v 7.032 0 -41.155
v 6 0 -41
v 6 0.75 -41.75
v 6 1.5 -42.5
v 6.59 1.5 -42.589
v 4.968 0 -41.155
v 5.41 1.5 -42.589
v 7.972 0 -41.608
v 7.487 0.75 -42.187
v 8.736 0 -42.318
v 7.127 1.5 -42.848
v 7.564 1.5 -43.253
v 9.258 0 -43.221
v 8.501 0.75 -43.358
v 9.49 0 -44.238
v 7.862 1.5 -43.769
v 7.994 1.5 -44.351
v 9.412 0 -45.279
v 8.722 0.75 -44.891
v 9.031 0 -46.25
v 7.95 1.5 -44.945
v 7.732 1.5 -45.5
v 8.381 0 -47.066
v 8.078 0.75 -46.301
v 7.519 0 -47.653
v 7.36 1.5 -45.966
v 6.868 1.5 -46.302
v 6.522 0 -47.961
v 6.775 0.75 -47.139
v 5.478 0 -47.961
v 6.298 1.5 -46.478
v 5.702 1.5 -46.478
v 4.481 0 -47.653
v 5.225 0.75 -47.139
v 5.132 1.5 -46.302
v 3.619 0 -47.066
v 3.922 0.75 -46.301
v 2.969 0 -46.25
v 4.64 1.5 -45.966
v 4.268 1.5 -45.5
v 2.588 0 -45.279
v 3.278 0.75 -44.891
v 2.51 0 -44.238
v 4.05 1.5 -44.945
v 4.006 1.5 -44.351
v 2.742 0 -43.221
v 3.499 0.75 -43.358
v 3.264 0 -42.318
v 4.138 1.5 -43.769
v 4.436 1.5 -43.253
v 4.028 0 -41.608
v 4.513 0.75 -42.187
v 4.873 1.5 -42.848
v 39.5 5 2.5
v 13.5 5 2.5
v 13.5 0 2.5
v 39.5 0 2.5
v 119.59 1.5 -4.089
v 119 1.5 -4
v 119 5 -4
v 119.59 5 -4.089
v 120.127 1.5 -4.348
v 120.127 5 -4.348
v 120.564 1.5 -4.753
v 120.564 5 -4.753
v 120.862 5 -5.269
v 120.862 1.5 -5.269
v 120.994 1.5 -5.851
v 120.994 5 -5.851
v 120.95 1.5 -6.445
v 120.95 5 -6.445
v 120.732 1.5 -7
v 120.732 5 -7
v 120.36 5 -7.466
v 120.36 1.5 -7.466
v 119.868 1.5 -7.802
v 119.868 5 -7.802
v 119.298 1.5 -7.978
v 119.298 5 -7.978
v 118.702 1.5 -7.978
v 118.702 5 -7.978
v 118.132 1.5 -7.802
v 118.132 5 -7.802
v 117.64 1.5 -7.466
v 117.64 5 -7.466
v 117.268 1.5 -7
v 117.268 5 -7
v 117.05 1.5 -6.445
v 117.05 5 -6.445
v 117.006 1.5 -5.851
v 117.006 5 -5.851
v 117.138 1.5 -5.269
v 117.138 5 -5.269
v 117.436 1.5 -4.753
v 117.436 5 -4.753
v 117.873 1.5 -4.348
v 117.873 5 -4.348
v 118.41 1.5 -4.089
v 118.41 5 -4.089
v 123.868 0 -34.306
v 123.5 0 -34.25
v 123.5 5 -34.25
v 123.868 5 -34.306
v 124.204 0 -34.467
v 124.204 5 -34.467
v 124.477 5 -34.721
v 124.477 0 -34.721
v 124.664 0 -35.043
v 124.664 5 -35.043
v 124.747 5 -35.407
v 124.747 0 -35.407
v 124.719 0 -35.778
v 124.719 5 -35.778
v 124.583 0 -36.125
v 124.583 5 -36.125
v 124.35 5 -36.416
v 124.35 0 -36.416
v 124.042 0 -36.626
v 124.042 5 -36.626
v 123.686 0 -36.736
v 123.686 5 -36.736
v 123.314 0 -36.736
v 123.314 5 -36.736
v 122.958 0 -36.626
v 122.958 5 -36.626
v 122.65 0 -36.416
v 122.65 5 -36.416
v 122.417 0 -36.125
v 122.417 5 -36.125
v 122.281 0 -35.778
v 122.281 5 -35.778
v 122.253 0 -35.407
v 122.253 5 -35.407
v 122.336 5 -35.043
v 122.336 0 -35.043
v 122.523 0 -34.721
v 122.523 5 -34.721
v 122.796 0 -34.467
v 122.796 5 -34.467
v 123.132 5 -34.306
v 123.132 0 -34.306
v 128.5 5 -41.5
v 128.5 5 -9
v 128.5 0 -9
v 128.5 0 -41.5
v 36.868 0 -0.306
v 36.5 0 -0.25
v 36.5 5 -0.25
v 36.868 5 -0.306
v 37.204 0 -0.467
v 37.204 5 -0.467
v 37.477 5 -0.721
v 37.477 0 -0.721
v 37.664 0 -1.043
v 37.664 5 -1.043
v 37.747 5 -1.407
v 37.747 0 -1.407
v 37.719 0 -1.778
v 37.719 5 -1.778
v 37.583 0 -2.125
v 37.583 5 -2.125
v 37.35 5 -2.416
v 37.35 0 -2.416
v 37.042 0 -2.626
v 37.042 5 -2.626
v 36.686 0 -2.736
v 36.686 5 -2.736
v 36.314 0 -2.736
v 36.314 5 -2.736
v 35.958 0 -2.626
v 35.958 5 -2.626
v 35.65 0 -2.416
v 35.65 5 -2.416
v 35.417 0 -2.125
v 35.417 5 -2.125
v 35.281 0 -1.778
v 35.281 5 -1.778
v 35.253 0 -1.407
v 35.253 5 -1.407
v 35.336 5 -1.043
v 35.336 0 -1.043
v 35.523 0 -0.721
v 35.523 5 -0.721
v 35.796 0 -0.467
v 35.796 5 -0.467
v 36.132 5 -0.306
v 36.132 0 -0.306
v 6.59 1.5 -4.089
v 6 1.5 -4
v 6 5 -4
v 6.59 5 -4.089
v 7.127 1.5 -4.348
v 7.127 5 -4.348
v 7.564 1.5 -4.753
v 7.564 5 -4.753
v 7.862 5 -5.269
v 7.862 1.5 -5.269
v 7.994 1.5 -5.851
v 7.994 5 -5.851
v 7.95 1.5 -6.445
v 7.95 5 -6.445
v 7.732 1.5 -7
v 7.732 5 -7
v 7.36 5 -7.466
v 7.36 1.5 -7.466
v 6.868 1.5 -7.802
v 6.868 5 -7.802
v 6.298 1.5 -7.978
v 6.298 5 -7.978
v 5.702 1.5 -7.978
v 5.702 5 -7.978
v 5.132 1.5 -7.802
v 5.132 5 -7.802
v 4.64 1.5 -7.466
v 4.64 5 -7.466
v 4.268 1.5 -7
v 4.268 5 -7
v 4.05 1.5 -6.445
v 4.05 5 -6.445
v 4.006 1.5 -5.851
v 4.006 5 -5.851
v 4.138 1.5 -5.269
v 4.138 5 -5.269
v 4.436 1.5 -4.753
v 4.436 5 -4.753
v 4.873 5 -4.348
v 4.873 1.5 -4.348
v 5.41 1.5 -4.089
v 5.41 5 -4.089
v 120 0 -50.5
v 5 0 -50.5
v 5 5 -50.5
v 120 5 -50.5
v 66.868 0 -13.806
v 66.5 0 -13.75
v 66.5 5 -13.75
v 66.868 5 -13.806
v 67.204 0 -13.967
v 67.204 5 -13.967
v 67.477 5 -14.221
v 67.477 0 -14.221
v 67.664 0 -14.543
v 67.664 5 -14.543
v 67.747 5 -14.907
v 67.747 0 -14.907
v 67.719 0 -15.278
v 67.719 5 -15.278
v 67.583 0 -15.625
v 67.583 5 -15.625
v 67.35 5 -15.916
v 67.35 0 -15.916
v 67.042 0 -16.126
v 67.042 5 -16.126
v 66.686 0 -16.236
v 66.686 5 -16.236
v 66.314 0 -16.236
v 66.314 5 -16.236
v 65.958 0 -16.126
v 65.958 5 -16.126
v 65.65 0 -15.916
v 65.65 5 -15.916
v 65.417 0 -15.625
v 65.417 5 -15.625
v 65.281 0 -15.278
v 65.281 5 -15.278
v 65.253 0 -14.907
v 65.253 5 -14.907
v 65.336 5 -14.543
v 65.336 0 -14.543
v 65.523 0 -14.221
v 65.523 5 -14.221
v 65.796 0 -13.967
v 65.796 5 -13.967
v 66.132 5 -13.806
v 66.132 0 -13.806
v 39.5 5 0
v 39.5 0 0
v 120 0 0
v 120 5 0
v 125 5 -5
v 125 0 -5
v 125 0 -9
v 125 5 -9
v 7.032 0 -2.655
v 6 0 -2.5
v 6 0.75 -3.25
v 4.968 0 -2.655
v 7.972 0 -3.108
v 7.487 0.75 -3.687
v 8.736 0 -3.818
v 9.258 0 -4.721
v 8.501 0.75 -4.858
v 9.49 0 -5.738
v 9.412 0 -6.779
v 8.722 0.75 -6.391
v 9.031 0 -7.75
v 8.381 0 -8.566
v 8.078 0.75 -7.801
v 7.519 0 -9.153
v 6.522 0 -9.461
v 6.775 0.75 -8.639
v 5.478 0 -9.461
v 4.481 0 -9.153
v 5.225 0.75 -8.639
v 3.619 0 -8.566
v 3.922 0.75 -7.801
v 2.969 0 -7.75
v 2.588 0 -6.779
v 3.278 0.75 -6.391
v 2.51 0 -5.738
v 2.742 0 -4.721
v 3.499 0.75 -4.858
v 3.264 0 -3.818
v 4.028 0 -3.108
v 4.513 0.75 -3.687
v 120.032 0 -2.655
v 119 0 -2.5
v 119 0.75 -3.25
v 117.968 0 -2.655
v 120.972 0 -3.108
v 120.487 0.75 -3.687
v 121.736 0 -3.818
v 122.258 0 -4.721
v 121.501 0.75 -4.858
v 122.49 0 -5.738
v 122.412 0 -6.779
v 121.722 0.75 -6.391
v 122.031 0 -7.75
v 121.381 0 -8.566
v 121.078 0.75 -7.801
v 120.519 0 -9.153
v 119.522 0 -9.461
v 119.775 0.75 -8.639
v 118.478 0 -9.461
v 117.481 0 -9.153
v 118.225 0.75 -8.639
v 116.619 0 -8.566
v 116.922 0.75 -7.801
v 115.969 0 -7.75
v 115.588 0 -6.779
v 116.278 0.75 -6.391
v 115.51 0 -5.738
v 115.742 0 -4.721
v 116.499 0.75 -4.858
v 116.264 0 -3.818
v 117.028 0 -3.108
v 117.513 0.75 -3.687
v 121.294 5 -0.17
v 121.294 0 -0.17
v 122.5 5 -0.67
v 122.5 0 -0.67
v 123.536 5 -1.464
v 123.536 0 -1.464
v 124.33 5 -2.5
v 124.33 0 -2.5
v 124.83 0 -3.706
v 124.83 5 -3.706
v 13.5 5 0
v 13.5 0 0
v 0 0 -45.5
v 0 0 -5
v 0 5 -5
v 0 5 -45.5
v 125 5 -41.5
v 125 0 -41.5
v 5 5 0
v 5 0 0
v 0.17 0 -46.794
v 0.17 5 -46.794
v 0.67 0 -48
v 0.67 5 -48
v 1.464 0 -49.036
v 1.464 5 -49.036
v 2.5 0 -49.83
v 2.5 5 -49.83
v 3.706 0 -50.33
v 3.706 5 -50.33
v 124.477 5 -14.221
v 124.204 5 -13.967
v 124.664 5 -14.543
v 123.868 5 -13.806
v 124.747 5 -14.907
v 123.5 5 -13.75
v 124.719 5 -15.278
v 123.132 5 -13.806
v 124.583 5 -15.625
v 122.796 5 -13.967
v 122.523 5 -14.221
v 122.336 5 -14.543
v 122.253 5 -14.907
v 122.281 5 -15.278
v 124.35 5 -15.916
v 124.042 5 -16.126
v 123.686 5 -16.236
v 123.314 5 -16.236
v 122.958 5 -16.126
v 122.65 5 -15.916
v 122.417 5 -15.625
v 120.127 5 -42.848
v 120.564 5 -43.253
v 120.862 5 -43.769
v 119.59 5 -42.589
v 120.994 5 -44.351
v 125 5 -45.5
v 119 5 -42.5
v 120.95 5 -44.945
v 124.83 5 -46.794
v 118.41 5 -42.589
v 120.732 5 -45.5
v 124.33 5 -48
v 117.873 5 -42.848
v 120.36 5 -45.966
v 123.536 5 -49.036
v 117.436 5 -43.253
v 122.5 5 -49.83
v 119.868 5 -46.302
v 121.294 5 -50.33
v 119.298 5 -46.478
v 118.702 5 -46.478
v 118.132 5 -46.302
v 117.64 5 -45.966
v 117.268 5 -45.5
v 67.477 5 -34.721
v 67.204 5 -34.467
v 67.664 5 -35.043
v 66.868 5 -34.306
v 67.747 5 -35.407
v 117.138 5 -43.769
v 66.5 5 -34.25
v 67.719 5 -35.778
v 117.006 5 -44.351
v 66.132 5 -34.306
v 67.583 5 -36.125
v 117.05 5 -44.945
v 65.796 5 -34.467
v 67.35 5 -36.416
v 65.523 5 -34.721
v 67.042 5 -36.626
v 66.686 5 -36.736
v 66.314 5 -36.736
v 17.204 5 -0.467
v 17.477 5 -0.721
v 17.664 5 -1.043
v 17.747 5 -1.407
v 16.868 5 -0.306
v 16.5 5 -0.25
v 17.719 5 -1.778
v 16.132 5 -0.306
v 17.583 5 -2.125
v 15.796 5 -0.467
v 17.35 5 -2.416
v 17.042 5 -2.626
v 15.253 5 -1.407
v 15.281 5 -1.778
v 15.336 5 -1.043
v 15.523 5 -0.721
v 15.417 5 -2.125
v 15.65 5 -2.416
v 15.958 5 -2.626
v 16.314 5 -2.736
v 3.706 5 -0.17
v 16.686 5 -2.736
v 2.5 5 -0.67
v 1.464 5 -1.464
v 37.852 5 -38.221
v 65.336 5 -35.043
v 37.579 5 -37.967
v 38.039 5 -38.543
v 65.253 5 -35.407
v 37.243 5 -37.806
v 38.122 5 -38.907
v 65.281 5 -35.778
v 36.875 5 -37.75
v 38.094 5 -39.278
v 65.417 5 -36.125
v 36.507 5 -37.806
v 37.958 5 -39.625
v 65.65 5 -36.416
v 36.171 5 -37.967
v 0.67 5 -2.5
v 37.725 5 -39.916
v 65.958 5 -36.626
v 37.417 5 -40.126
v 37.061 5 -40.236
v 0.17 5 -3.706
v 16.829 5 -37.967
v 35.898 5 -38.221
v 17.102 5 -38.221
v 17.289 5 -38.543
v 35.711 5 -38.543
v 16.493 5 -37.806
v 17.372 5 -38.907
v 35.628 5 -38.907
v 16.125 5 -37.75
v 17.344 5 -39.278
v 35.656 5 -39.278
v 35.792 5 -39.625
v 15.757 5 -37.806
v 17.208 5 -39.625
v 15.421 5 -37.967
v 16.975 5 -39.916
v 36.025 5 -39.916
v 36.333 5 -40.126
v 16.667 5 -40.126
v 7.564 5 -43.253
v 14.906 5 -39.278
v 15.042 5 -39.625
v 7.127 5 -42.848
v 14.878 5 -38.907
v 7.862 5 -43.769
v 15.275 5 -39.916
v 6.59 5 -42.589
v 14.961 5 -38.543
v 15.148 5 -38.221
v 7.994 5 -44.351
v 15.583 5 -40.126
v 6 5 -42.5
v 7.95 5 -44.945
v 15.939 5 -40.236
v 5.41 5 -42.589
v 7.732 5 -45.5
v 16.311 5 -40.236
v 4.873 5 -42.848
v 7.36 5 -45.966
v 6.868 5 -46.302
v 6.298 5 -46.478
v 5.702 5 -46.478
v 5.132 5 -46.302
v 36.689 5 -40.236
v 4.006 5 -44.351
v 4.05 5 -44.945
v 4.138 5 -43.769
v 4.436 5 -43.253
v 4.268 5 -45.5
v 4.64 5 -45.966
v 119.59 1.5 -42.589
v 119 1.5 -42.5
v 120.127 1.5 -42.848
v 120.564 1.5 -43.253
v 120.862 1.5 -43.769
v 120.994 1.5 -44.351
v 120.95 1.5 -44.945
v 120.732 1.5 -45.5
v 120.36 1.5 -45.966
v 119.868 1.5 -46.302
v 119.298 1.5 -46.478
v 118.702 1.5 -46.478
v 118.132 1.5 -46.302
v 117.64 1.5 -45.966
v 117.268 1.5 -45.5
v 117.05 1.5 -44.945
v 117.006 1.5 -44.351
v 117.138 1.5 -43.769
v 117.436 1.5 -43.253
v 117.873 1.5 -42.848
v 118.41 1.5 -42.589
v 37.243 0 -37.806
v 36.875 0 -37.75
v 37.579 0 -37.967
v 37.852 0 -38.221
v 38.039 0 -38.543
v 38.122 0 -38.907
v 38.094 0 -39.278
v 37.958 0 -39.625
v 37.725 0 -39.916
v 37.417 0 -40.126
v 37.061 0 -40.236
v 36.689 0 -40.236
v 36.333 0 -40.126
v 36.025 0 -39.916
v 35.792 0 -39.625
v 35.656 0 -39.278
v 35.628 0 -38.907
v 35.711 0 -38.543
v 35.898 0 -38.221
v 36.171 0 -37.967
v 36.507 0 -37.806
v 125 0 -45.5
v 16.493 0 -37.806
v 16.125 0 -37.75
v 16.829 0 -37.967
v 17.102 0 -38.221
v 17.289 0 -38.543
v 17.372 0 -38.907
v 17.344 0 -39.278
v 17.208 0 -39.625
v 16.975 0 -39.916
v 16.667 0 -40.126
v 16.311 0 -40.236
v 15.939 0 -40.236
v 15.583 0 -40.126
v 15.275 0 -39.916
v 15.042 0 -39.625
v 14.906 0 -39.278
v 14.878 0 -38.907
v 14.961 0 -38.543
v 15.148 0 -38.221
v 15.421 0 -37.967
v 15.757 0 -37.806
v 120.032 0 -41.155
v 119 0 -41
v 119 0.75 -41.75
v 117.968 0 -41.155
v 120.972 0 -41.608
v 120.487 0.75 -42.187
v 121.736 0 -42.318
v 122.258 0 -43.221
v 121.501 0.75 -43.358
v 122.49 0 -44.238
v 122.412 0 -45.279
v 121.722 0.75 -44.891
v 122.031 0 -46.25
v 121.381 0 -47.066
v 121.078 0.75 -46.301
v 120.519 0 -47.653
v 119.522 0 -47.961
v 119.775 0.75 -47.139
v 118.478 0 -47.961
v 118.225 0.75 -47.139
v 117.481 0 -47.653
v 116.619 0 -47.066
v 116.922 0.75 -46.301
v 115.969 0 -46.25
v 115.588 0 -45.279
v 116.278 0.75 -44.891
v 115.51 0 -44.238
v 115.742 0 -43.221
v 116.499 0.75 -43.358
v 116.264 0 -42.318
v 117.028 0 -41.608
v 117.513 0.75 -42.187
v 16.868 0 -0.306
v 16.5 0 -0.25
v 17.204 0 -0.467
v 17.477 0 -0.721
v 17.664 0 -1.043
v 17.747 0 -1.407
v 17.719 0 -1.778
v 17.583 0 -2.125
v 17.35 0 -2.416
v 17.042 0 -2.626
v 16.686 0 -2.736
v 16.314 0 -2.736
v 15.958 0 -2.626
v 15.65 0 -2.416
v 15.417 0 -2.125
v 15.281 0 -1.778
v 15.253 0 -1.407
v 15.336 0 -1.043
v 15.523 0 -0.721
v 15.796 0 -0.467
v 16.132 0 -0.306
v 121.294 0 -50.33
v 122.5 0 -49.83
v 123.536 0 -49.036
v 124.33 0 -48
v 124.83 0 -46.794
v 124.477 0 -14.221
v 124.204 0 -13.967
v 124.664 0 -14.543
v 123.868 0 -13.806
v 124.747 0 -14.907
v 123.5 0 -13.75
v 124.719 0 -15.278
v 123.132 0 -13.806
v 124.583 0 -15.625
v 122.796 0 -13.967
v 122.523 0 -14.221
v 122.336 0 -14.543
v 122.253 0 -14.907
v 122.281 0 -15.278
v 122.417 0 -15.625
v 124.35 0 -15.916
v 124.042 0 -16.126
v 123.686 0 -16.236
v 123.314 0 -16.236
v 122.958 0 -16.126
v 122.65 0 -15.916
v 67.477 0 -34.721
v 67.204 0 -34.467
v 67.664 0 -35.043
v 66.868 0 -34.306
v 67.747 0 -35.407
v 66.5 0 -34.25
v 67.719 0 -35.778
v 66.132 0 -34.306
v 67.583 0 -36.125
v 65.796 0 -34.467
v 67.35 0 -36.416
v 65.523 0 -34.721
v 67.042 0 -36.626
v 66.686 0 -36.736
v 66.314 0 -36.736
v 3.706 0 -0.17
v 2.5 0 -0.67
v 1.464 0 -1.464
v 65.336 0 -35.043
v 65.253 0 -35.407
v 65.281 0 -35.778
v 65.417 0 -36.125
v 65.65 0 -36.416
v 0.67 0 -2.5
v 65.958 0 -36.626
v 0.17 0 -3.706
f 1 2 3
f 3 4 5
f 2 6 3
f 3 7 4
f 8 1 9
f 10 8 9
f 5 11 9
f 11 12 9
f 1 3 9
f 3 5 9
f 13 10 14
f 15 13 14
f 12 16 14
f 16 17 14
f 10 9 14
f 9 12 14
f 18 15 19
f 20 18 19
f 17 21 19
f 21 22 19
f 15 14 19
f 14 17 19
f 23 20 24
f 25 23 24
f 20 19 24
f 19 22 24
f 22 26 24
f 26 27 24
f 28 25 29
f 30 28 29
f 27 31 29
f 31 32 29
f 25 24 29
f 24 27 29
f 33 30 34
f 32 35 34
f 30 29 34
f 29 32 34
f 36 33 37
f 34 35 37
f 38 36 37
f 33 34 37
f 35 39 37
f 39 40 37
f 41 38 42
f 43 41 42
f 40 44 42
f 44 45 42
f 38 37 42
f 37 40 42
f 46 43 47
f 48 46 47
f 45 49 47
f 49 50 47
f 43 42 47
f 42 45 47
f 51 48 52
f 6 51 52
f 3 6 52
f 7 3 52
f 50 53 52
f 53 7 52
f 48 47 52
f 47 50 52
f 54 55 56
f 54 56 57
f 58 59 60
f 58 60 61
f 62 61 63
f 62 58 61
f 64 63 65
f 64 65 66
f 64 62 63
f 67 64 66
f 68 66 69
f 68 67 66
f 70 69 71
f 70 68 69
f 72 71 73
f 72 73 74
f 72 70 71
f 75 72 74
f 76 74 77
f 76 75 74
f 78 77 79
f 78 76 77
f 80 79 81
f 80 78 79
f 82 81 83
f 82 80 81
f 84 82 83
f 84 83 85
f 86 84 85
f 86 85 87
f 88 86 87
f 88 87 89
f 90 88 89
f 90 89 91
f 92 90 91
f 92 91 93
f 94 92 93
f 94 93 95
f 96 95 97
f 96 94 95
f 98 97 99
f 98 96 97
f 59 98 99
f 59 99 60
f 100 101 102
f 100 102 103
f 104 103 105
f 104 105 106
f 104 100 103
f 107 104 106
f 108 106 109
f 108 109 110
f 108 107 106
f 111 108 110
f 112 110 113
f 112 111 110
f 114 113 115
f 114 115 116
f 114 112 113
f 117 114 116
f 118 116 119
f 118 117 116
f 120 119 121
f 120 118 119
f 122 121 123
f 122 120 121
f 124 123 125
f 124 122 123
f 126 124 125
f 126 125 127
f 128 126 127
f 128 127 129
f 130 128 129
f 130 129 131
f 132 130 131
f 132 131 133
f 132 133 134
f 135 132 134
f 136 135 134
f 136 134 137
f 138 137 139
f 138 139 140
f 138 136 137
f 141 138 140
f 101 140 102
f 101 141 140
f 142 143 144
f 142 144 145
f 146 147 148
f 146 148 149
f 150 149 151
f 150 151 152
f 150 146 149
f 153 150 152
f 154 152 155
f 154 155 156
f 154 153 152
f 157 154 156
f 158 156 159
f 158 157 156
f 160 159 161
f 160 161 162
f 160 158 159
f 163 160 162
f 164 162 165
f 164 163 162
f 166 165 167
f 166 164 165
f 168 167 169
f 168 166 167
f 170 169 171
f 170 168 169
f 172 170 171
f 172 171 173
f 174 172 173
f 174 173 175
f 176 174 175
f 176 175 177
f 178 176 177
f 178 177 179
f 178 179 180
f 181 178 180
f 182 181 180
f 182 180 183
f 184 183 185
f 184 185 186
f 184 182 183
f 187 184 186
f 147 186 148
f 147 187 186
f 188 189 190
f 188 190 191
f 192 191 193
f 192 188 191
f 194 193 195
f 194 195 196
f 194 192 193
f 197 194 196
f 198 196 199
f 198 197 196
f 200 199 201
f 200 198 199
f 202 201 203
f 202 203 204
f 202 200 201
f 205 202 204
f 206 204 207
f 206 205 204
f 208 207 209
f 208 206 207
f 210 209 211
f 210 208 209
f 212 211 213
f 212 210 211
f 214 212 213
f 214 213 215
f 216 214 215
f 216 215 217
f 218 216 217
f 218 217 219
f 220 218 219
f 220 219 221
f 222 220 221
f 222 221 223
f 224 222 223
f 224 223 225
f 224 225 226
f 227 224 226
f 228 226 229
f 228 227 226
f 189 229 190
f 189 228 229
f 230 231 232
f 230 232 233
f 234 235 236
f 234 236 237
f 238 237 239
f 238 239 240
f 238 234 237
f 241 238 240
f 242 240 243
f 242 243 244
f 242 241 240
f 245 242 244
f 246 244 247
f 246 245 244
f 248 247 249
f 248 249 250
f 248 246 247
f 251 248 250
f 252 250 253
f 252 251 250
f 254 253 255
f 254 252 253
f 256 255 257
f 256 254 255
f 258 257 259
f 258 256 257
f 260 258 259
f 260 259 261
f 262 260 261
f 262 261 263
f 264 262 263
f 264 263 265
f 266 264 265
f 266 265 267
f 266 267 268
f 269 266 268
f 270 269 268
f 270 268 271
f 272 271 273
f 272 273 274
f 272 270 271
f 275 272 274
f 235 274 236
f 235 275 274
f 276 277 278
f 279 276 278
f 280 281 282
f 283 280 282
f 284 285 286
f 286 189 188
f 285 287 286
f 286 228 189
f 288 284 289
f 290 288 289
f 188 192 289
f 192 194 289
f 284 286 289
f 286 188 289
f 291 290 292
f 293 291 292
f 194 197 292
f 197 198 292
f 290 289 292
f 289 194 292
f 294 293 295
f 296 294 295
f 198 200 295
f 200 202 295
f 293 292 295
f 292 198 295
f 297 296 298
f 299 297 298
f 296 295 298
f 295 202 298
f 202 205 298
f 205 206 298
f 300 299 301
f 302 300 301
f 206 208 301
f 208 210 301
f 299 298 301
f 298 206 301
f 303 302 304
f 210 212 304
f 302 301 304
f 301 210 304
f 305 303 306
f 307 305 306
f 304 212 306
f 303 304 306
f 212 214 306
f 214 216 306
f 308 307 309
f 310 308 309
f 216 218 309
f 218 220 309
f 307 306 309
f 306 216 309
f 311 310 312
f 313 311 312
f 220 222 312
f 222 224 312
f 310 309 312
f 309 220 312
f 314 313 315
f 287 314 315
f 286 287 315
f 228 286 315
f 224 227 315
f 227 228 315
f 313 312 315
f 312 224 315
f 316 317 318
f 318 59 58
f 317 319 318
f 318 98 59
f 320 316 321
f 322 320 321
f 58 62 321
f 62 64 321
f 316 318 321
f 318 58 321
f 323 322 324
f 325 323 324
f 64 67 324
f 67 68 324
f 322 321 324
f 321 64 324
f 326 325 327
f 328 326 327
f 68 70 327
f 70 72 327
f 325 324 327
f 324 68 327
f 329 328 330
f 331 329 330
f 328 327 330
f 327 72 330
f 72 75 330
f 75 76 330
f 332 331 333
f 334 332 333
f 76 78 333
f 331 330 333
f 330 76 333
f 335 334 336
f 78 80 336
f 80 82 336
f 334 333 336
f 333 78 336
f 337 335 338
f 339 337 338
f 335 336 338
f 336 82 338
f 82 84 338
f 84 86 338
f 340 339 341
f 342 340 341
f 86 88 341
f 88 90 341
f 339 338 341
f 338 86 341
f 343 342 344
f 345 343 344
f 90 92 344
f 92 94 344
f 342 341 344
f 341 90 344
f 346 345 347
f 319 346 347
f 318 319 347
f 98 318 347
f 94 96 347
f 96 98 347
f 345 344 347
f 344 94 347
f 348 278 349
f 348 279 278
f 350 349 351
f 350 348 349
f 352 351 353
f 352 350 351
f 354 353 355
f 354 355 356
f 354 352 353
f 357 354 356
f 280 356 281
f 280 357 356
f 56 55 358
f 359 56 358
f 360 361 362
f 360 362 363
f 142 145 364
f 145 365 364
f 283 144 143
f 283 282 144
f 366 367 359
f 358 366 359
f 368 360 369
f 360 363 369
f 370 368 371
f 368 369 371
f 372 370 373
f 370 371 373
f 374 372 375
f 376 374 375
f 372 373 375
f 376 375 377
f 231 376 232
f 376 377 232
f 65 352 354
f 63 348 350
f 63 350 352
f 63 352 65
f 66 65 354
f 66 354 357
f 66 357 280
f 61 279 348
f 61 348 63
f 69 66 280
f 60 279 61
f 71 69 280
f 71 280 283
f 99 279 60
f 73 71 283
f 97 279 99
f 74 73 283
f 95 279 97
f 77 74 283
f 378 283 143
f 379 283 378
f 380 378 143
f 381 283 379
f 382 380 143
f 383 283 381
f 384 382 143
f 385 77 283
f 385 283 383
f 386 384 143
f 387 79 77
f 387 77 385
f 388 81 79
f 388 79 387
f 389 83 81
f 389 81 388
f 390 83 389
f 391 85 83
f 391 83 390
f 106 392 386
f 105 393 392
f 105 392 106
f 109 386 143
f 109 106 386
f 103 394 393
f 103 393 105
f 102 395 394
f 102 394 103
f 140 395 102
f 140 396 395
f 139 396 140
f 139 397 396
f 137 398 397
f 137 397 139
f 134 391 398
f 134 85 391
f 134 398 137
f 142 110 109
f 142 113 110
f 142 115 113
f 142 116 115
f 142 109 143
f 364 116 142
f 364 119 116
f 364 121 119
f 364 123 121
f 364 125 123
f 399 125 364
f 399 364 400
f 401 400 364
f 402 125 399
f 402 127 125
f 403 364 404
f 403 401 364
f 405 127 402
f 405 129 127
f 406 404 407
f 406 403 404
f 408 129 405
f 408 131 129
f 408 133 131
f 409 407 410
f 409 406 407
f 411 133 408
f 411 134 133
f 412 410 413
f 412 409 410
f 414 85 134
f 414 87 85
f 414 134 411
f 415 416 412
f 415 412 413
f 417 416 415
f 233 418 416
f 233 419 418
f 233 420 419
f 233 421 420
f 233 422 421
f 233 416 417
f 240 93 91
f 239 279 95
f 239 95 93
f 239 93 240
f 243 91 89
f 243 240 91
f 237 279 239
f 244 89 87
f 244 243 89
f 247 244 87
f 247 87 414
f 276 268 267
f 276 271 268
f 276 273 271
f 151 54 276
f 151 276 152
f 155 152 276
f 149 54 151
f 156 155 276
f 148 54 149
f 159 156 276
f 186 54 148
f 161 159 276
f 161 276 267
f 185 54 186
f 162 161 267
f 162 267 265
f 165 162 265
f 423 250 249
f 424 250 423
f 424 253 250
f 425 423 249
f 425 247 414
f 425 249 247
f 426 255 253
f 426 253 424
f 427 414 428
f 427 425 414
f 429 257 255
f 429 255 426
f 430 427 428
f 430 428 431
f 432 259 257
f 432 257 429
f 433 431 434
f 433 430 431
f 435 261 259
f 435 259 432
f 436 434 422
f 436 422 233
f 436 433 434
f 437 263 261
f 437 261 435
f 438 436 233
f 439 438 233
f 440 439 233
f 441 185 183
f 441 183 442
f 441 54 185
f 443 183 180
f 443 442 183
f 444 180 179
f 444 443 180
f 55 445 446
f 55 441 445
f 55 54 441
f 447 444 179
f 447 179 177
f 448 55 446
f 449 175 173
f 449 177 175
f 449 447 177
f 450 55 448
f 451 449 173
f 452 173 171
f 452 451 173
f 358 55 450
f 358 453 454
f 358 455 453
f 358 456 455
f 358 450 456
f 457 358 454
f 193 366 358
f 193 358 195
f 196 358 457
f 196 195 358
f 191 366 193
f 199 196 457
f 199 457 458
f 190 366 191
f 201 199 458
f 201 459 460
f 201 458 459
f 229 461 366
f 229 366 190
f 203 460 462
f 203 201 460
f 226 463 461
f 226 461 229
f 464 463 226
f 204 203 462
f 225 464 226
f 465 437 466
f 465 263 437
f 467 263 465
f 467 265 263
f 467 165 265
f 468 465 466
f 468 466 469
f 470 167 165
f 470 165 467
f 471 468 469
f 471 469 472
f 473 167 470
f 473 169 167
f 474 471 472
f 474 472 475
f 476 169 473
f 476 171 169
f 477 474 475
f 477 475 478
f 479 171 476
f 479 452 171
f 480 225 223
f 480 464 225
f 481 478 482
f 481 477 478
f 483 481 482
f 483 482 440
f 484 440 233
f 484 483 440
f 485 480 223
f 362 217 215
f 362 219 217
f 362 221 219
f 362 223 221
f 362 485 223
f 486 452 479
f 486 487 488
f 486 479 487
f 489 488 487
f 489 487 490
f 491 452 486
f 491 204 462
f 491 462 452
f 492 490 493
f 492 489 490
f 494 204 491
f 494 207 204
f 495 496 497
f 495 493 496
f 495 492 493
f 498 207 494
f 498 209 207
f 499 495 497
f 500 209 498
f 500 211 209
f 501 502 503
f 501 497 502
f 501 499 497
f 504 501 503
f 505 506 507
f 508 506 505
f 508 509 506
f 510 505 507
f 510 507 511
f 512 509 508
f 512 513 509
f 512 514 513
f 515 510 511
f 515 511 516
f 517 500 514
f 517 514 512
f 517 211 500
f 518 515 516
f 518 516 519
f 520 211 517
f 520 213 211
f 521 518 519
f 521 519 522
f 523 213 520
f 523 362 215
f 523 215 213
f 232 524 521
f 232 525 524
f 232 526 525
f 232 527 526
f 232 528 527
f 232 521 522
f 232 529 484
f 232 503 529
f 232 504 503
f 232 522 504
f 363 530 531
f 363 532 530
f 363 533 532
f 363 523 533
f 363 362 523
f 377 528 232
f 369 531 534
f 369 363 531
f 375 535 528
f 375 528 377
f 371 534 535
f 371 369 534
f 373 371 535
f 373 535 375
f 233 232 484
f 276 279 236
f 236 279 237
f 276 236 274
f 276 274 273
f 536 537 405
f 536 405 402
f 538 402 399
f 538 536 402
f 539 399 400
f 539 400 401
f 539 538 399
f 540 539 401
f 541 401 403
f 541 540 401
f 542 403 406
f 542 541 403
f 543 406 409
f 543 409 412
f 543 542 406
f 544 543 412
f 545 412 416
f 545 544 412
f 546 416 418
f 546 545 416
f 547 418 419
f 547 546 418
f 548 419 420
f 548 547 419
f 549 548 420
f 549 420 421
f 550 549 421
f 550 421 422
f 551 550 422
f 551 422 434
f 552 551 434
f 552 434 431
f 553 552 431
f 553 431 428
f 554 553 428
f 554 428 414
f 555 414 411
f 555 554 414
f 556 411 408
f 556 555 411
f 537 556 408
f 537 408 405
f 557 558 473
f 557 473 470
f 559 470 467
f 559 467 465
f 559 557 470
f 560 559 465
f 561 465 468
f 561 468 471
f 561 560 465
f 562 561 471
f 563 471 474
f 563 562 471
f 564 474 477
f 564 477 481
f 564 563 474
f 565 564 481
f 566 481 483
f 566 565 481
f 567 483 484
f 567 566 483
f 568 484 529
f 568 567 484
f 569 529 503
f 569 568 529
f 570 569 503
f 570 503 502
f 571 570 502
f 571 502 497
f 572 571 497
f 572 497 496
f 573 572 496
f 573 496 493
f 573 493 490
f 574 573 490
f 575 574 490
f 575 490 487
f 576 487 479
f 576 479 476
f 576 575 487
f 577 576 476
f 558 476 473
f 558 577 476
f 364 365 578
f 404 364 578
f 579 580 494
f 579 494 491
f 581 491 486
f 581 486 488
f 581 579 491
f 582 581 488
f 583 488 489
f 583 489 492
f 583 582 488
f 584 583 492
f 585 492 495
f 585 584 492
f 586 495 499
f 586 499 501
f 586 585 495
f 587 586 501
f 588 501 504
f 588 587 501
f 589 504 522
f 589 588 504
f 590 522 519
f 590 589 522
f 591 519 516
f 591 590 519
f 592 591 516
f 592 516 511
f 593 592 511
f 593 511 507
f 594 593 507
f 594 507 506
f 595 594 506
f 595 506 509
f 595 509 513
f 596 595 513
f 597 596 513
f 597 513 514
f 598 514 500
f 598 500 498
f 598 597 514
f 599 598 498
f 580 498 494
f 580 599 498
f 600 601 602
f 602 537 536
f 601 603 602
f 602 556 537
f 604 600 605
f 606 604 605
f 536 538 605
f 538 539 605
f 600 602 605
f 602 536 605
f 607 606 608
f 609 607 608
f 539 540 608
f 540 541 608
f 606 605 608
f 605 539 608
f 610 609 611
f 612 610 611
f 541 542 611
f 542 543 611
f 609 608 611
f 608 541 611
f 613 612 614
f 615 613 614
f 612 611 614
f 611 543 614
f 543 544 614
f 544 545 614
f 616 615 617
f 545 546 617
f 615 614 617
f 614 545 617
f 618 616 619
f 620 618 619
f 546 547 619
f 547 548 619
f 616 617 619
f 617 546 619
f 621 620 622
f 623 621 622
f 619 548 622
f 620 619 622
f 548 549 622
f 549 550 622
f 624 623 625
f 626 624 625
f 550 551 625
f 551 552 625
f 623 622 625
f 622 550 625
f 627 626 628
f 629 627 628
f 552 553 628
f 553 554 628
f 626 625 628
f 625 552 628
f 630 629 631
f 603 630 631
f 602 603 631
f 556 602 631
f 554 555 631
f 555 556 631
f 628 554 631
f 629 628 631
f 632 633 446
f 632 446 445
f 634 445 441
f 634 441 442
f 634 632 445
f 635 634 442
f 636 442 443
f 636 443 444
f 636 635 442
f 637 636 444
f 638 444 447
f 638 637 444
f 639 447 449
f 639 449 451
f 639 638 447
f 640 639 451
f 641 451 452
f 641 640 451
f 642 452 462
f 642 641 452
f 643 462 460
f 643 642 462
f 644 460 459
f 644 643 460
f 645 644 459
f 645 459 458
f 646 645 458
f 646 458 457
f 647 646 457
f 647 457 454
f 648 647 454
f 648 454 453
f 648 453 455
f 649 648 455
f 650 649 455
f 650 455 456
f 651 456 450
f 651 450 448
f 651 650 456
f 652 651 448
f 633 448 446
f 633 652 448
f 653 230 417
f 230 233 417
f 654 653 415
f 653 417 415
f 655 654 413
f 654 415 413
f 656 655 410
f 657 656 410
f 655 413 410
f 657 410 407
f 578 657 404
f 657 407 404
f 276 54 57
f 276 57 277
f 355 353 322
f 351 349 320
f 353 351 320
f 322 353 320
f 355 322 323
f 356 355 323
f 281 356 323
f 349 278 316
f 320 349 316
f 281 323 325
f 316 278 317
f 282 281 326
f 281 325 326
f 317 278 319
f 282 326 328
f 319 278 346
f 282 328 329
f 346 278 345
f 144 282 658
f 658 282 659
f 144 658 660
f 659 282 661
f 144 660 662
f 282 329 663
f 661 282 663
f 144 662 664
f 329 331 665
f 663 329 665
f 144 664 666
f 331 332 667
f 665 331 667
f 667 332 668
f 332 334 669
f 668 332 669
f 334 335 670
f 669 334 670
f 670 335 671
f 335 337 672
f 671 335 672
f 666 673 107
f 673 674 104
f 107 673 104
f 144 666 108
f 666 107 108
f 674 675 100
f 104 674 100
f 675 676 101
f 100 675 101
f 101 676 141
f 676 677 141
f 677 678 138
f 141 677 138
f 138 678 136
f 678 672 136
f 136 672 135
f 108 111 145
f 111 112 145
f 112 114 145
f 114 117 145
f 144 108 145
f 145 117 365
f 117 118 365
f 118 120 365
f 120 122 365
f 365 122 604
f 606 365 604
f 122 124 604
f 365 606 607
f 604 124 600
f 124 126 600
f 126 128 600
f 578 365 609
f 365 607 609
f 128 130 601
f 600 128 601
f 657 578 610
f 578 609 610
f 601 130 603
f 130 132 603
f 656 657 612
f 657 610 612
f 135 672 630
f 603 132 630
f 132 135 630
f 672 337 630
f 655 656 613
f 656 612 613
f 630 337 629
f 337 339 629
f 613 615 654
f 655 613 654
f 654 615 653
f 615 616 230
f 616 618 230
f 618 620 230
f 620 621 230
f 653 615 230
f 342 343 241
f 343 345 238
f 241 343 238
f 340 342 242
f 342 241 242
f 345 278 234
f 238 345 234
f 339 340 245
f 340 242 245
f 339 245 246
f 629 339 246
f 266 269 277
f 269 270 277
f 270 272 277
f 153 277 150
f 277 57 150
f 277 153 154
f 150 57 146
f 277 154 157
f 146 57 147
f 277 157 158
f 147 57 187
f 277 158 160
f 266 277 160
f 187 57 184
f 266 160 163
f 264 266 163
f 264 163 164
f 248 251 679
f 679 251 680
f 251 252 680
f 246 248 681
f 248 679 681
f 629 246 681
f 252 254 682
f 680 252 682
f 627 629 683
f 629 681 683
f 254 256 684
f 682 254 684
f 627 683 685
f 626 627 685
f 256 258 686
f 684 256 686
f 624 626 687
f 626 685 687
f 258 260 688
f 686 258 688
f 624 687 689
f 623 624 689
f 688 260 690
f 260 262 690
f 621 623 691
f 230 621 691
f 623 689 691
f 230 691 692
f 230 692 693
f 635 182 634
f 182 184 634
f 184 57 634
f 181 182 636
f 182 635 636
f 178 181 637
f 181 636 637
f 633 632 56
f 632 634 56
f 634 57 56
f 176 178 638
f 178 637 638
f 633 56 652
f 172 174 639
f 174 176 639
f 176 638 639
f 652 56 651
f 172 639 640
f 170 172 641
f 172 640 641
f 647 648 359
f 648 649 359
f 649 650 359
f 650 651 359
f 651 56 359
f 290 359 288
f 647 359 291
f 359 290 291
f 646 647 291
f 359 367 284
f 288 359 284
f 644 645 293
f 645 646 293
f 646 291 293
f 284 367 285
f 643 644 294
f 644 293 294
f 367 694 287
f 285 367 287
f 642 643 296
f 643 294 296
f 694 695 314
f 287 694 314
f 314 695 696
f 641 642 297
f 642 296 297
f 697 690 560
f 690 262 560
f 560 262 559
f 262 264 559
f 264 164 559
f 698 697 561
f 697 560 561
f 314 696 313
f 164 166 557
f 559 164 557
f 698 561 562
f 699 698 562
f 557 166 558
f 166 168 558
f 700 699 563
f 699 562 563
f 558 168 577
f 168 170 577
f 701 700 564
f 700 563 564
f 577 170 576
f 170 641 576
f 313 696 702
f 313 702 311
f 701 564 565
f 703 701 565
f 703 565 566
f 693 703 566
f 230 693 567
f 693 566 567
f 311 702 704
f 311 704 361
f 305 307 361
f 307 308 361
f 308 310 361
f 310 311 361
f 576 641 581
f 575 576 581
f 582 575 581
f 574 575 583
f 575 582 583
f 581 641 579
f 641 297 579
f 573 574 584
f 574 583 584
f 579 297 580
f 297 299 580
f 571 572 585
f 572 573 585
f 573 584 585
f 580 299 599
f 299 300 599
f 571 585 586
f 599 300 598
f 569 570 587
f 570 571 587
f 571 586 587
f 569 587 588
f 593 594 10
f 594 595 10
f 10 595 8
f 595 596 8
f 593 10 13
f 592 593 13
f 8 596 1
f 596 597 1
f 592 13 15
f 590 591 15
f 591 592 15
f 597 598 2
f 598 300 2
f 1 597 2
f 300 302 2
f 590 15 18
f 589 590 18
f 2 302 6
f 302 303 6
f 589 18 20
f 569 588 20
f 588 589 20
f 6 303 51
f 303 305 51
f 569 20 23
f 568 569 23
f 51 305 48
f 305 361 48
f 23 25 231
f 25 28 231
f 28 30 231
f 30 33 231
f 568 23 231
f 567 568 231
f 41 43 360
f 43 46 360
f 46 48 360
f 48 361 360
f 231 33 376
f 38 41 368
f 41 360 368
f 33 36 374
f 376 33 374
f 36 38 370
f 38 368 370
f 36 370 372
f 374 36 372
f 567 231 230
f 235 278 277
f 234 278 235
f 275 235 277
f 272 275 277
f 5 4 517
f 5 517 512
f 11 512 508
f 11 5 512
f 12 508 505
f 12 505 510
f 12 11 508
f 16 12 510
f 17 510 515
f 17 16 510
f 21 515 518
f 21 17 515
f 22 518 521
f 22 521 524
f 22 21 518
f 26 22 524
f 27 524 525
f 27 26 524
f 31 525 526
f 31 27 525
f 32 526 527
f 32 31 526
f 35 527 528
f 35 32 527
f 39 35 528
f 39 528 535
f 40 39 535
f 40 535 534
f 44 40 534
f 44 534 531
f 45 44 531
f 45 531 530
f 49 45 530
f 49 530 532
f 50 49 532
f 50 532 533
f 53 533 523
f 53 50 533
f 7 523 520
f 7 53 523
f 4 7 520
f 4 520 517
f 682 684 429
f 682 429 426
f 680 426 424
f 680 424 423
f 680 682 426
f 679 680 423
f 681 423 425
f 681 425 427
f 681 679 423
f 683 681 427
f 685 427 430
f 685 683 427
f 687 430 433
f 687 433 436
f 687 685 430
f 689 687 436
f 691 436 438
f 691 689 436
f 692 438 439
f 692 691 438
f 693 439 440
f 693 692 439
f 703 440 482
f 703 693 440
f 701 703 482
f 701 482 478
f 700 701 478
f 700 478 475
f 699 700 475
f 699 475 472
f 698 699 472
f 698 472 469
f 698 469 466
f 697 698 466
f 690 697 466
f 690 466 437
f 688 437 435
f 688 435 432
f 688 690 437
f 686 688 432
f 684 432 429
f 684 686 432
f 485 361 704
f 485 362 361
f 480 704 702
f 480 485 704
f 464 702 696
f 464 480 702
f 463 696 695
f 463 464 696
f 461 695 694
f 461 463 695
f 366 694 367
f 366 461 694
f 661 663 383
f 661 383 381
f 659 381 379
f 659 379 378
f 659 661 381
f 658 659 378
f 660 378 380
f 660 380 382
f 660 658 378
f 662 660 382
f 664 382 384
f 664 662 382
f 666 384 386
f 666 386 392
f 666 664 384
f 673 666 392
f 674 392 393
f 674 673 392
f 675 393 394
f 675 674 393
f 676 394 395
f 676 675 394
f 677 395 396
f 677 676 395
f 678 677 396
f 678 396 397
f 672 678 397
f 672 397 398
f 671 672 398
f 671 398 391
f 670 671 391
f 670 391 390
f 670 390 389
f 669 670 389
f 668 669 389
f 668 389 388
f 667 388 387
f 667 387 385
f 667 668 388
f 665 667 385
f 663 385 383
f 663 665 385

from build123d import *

# Parameters (mm, degrees)
SKETCH1_W           = 125
SKETCH1_H           = 50.5
SKETCH1_R           = 1.25
SKETCH1_R_2         = 2
BOSS_EXTRUDE1_DEPTH = 5
FILLET1_R           = 5
CHAMFER1_SIZE       = 1.5
SKETCH3_W           = 3
SKETCH3_H           = 32.5
SKETCH3_W_2         = 26
SKETCH3_H_2         = 3
BOSS_EXTRUDE2_DEPTH = 5
SKETCH5_W           = 26
SKETCH5_H           = 5
CUT_EXTRUDE1_DEPTH  = 0.5
SKETCH6_W           = 32.5
SKETCH6_H           = 5
BOSS_EXTRUDE4_DEPTH = 0.5


with BuildPart() as part:
    # Sketch1 → Boss-Extrude1 (new body)
    with BuildSketch(Plane(origin=(0, 0, 0), x_dir=(1, 0, 0), z_dir=(0, 1, 0))):
        with Locations((62.5, 25.25)):
            Rectangle(SKETCH1_W, SKETCH1_H)
        with Locations(Location((16.5, 1.5, 0), (0, 0, 270))):
            Circle(SKETCH1_R, mode=Mode.SUBTRACT)
        with Locations(Location((6, 6, 0), (0, 0, 270))):
            Circle(SKETCH1_R_2, mode=Mode.SUBTRACT)
        with Locations(Location((36.5, 1.5, 0), (0, 0, 270))):
            Circle(SKETCH1_R, mode=Mode.SUBTRACT)
        with Locations(Location((119, 6, 0), (0, 0, 270))):
            Circle(SKETCH1_R_2, mode=Mode.SUBTRACT)
        with Locations(Location((16.125, 39, 0), (0, 0, 270))):
            Circle(SKETCH1_R, mode=Mode.SUBTRACT)
        with Locations(Location((6, 44.5, 0), (0, 0, 270))):
            Circle(SKETCH1_R_2, mode=Mode.SUBTRACT)
        with Locations(Location((36.875, 39, 0), (0, 0, 270))):
            Circle(SKETCH1_R, mode=Mode.SUBTRACT)
        with Locations(Location((66.5, 35.5, 0), (0, 0, 270))):
            Circle(SKETCH1_R, mode=Mode.SUBTRACT)
        with Locations(Location((123.5, 35.5, 0), (0, 0, 270))):
            Circle(SKETCH1_R, mode=Mode.SUBTRACT)
        with Locations(Location((66.5, 15, 0), (0, 0, 270))):
            Circle(SKETCH1_R, mode=Mode.SUBTRACT)
        with Locations(Location((123.5, 15, 0), (0, 0, 270))):
            Circle(SKETCH1_R, mode=Mode.SUBTRACT)
        with Locations(Location((119, 44.5, 0), (0, 0, 270))):
            Circle(SKETCH1_R_2, mode=Mode.SUBTRACT)
    extrude(amount=BOSS_EXTRUDE1_DEPTH)

    # Fillet1
    fillet1_edges = [part.edges().sort_by_distance(p)[0] for p in [
        (125, 2.5, 0),
        (0, 2.5, 0),
        (0, 2.5, -50.5),
        (125, 2.5, -50.5),
    ]]
    fillet(fillet1_edges, radius=FILLET1_R)

    # Chamfer1
    chamfer1_edges = [part.edges().sort_by_distance(p)[0] for p in [
        (119, 0, -8),
        (6, 0, -8),
        (6, 0, -46.5),
        (119, 0, -46.5),
    ]]
    chamfer(chamfer1_edges, length=CHAMFER1_SIZE)

    # Sketch3 → Boss-Extrude2 (add)
    with BuildSketch(Plane(origin=(0, 5, 0), x_dir=(1, 0, 0), z_dir=(0, 1, 0))):
        with Locations((126.5, 25.25)):
            Rectangle(SKETCH3_W, SKETCH3_H)
        with Locations((26.5, -1.5)):
            Rectangle(SKETCH3_W_2, SKETCH3_H_2)
    extrude(amount=-BOSS_EXTRUDE2_DEPTH)

    # Sketch5 → Cut-Extrude1 (cut)
    with BuildSketch(Plane.XY.offset(3)):
        with Locations((26.5, 2.5)):
            Rectangle(SKETCH5_W, SKETCH5_H)
    extrude(amount=-CUT_EXTRUDE1_DEPTH, mode=Mode.SUBTRACT)

    # Sketch6 → Boss-Extrude4 (add)
    with BuildSketch(Plane(origin=(128, 0, 0), x_dir=(0, 0, -1), z_dir=(1, 0, 0))):
        with Locations((25.25, 2.5)):
            Rectangle(SKETCH6_W, SKETCH6_H)
    extrude(amount=BOSS_EXTRUDE4_DEPTH)


solid = part.part
